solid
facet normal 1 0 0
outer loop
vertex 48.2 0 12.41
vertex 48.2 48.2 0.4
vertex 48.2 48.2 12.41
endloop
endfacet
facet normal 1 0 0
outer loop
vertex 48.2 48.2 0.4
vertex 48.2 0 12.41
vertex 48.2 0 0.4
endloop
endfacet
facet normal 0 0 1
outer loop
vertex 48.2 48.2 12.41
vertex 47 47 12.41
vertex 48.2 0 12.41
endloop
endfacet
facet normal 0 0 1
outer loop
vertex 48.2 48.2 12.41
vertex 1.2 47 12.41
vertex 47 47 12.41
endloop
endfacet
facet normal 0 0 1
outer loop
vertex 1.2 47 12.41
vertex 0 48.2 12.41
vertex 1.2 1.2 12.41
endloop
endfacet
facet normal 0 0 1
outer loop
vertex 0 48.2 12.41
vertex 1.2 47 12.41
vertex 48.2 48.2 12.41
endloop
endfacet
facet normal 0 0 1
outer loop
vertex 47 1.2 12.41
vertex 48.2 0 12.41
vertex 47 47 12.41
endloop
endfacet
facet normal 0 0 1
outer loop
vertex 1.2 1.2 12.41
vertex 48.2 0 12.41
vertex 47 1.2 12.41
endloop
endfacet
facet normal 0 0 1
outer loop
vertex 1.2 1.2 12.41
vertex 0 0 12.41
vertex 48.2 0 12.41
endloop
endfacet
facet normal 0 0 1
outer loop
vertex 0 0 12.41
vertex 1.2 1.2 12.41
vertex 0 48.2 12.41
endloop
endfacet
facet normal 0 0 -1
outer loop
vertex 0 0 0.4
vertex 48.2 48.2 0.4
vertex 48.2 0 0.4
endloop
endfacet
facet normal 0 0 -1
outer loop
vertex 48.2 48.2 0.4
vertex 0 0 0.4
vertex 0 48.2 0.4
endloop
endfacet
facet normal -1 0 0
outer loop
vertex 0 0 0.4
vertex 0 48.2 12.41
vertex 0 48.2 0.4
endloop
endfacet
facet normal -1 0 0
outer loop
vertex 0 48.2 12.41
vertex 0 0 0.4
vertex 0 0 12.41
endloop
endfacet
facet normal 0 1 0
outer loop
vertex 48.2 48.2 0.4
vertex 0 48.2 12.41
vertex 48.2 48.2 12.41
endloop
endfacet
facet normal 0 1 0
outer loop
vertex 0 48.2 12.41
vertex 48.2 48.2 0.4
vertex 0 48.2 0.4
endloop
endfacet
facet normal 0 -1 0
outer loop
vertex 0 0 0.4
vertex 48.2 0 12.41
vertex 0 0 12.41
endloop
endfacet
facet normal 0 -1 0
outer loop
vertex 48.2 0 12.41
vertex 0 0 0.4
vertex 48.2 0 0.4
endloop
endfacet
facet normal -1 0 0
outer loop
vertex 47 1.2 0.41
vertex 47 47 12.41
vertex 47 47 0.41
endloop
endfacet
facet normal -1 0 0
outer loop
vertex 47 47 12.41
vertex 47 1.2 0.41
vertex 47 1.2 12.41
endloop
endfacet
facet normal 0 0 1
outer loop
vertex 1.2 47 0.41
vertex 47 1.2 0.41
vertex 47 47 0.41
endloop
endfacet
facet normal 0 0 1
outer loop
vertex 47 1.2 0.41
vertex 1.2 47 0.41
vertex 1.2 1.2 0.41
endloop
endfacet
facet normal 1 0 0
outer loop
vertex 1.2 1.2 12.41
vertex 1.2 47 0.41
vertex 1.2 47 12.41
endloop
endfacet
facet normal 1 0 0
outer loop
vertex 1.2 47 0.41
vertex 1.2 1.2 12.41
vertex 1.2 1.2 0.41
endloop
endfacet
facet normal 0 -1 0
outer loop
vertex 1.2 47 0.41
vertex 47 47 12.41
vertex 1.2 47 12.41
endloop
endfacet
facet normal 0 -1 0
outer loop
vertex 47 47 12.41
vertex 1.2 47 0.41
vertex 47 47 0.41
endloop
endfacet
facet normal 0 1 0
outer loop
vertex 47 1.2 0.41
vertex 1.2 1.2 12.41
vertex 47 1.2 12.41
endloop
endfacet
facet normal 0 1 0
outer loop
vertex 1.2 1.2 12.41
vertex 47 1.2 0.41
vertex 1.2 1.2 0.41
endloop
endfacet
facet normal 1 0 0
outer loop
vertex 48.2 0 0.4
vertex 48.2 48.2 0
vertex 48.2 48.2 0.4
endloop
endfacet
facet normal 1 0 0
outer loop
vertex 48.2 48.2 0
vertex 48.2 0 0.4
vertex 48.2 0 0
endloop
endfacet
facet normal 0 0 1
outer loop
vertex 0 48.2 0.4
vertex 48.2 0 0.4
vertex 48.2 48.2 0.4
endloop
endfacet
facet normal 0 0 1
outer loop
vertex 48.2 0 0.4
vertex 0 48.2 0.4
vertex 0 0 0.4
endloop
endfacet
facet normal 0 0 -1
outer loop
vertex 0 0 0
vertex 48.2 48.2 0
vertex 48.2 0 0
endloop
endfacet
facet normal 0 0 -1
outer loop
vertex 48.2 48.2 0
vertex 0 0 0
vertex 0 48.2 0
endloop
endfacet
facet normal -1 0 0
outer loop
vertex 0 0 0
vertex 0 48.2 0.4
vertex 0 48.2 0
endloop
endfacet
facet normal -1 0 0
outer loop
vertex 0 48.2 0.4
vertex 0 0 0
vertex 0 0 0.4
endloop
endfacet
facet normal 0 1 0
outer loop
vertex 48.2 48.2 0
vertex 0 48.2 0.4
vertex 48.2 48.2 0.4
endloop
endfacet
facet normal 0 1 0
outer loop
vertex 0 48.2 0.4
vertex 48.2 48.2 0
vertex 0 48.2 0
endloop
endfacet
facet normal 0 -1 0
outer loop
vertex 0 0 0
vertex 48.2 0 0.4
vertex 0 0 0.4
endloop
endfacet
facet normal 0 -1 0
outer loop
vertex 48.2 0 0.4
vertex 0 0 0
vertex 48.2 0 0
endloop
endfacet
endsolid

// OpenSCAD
// file: ../../Base/Rotation.scad
// Fischertechnik Box Foundation
// Geometry Helpers Rotation

include <PlacementOptions.scad>

// getRotatedSpace(space, rotation=NoRotation)
// Rotates the space dependent on the specified rotation

function getRotatedSpace(space, rotation=NoRotation) = [
    (rotation == Rotate90 || rotation == Rotate270) ? space.y : space.x,
    (rotation == Rotate90 || rotation == Rotate270) ? space.x : space.y
];

// Rotates the given space around the fixed left lower corner
// space = the space the children needs as width/depth list [width,depth]
// rotation = 0 Rotate0 degrees, 1 Rotate90 degrees, 2 Rotate180 degrees, 3 Rotate270 degrees (equivalent to -90)

module RotateFix(space, rotation=NoRotation) {
    dy = (rotation == Rotate0 || rotation == Rotate270) ? 0 :
        (rotation == Rotate90) ? space.x :
        space.y;
    dx = (rotation < Rotate180) ? 0 :
        (rotation == Rotate180) ? space.x :
        space.y;
    
    translate([dx, dy, 0])
        rotate([0, 0, rotations[rotation]])
            children();
}
// file: ../../Base/Alignment.scad
// Fischertechnik Box Foundation
// Geometry Helpers Alignment

include <PlacementOptions.scad>

// getAlignedX(elementWidth, spaceWidth, align=AlignRight, offset=0)
// Gets the aligned X offset of an element with the given
// width in the given space.
// elementWidth = The width of the element to positon
// spaceWidth = The space where the element should be aligned
// align = 0 AlignLeft, 1 AlignCenter, 2 AlignRight
// offset = an optional offset from the aligned position. When
// aligned left or centered, then positive values are in X direction.
// When aligned right then positive values are in negative X direction.

function getAlignedX(elementWidth, spaceWidth, align=AlignRight, offset=0) =
    (align == AlignLeft) ?
        offset :
        ((align == AlignCenter) ?
        (spaceWidth - elementWidth)/2 + offset :
        spaceWidth - offset - elementWidth);

// getAlignedY(elementDepth, spaceDepth, align=AlignTop, offset=0)
// Gets the aligned Y offset of an element with the given
// depth in the given space.
// elementDepth = The depth of the element to positon
// spaceDepth = The space where the element should be aligned
// align = 0 AlignBottom, 1 AlignCenter, 2 AlignTop
// offset = an optional offset from the aligned position. When
// aligned bottom or centered, then positive values are in Y direction.
// When aligned top then positive values are in negative Y direction.

function getAlignedY(elementDepth, spaceDepth, align=AlignTop, offset=0) =
    (align == AlignBottom) ?
        offset :
        ((align == AlignCenter) ?
        (spaceDepth - elementDepth)/2 + offset :
        spaceDepth - offset - elementDepth);
// file: ../../Base/PlacementOptions.scad
// Fischertechnik Box Foundation
// Placement Options

// Alignment
NoAlign = 0;
AlignLeft = 1;
AlignBottom = 2;
AlignCenter = 3;
AlignRight = 4;
AlignTop = 5;

// Element rotation degree steps
rotations = [0, -90, -180, -270];

// Rotation
NoRotation = 0;
Rotate0 = 0;
Rotate90 = 1;
Rotate180 = 2;
Rotate270 = 3;

// Docking (seen from above)
NoDock = -1;
DockLeft = 0;
DockTop = 1;
DockRight = 2;
DockCorner = 2;
DockBottom = 3;

// Web corners
LowerLeft = 0;
UpperLeft = 1;
UpperRight = 2;
LowerRight = 3;

// Web position relative to corner
LeftOfCorner = 0;
RightOfCorner = 1;
// file: ../../Base/Boxes.scad
// Fischertechnik Box Foundation
// Pre-designed Boxes

use <Constants.scad>

include <PlacementOptions.scad>

box190Width = 190;
box190Depth = 130;
box130Width = 130;
box130Depth = 95;

// Values are from an original ec3 box
topBottomDifference = 1.5;
outerHeight = 40;
innerHeight = 38.2;
baseThickness = outerHeight - innerHeight;
stackExcess = 5.7;
radius = 3.5;
wallThickness = 1.5;
tolerance = 0.2;
stackOffset = innerHeight - stackExcess;

boxUsageHeight = stackOffset;
boxWallThickness = wallThickness;
boxBaseThickness = baseThickness;
boxWebWidth = 3.0;

// getBoxWallThickness()
// Gets the wall thickness of a Fischertechnik Box
function getBoxWallThickness() = boxWallThickness;

// getBoxUsageHeight()
// Gets the usable height of a Fischertechnik box
function getBoxUsageHeight() = boxUsageHeight;

// getBoxInnerHeight()
// Gets the inner height of a Fischertechnik box, including the stack excess
function getBoxInnerHeight() = innerHeight;

// getBoxBaseThickness()
// Gets the thickness of the Fischertechnik box base.
function getBoxBaseThickness() = boxBaseThickness;

// getBoxWebWidth()
// Gets the width of a box web
function getBoxWebWidth() = boxWebWidth;

// getBox190Space()
// Gets the usable inner space of a Box 190 as an x/y-list
function getBox190Space() = [
    box190Width - 2*getBoxWallThickness() - topBottomDifference, 
    box190Depth - 2*getBoxWallThickness() - topBottomDifference ];

// BoxBase(width, depth)
// Creates an empty stackable Fischertechnik compatible box
// width = Outer width of the box (190, 130, ...)
// depth = Outer depth of the box (130, 95, ...)

module BoxBase(width, depth, height=outerHeight) {    
    thinPlate = 0.01;

    innerHeight = height - baseThickness;    
    
    module BodyPlate(width, depth) {
        translate([radius, radius])
        hull() {
            w = width-2*radius;
            d = depth-2*radius;
            cube([w, d, thinPlate]);
            cylinder(thinPlate, r=radius, $fn=getFragments());
            translate([w, 0])
                cylinder(thinPlate, r=radius, $fn=getFragments());
            translate([w, d])
                cylinder(thinPlate, r=radius, $fn=getFragments());
            translate([0, d])
                cylinder(thinPlate, r=radius, $fn=getFragments());
        }
    }
    
    module Body(tolerance=tolerance) {
        hull() {
            // Bottom with tolerance to fit into the original boxes when stacked
            translate([-wallThickness+tolerance, -wallThickness+tolerance, -baseThickness])
                BodyPlate(width-topBottomDifference-2*tolerance, depth-topBottomDifference-2*tolerance);
            
            // Top
            translate([-wallThickness-topBottomDifference/2, -wallThickness-topBottomDifference/2, innerHeight-thinPlate])
                BodyPlate(width, depth);
         }
    }

    module Cutoff() {
        hull() {
            coWidth = width - 2*wallThickness;
            coDepth = depth - 2*wallThickness;
            
            // Bottom
            BodyPlate(coWidth-topBottomDifference, coDepth-topBottomDifference);

            // Top
            translate([-topBottomDifference/2, -topBottomDifference/2, innerHeight+thinPlate]) 
                BodyPlate(coWidth, coDepth);
        }
    }
    
    difference() {        
        Body();
        Cutoff();
        stackOffset = innerHeight - stackExcess;
        translate([0, 0, stackOffset + baseThickness])
            Body(tolerance=0);
    }
}

// Creates the Fischertechnik empty box 130x190 mm and places it at position 0,0
// 190x130 are the outer sizes, the inner space is slightly smaller. Use getBox190Space() to get the inner sizes.
// The box is positioned that the usable inner space is at the 0,0,0 position. The

module Box190() {
    BoxBase(box190Width, box190Depth);
}

// Gets the usable inner space of a Box 130 as an x/y-list
function getBox130Space() = [
    box130Width - 2*getBoxWallThickness() - topBottomDifference, 
    box130Depth - 2*getBoxWallThickness() - topBottomDifference ];

// Creates the Fischertechnik empty box 95x130 mm and places it at position 0,0
// 190x130 are the outer sizes, the inner space is slightly smaller. Use getBox190Space() to get the inner sizes.
// The box is positioned that the usable inner space is at the 0,0,0 position. The

module Box130() {
    BoxBase(box130Width, box130Depth);
}

// Creates a web at the specified box walls
// corner 0 = LowerLeft, 1 = UpperLeft, 2 = UpperRight, 3 = LowerRight
// side 0 = LeftOfCorner, 1 = RightOfCorner
// distance = Distance in mm from the corner
// boxSpace = inner width and depth of the box (default: Box 190)
// webWidth = length of the web (default is 3 mms)
// webThickness = thickness of the web (default is 1 mm)

module BoxWeb(corner, side, distance, boxSpace=getBox190Space(), webWidth=getBoxWebWidth(), webThickness=1.0) {
    sink = getBoxWallThickness()/2;

    width = (corner % 2 == 0) ? 
            (side == LeftOfCorner ? webWidth : webThickness) :
            (side == LeftOfCorner ? webThickness : webWidth);

    depth = (corner % 2 == 0) ? 
            (side == RightOfCorner ? webWidth : webThickness) :
            (side == RightOfCorner ? webThickness : webWidth);
    
    xDiff = corner == LowerLeft ? 
                (side == LeftOfCorner ? -sink : distance) :
            (corner == UpperLeft ?                
                (side == LeftOfCorner ? distance : -sink) :
            (corner == UpperRight ?
                (side == LeftOfCorner ? boxSpace.x-webWidth+sink : boxSpace.x-distance-webThickness) :
                (side == LeftOfCorner ? boxSpace.x-distance-webThickness: boxSpace.x-webWidth+sink)));

    yDiff = corner == LowerLeft ? 
                (side == RightOfCorner ? -sink : distance) :
            (corner == UpperLeft ?
                (side == RightOfCorner ? boxSpace.y-distance : boxSpace.y-webWidth+sink) :
            (corner == UpperRight ?
                (side == RightOfCorner ? boxSpace.y-webWidth+sink : boxSpace.y-distance) :
                (side == RightOfCorner ? distance : -sink)));
    
    translate([xDiff, yDiff, -getExcess()])
        cube([width, depth, boxUsageHeight + 2*getExcess()]);
}
// file: ../../Base/Placement.scad
// Fischertechnik Box Foundation
// Geometry Helpers Placement

use <Constants.scad>
use <Alignment.scad>
use <Rotation.scad>
use <Boxes.scad>

include <PlacementOptions.scad>

// Place(x=0, y=0, elementSpace=[0,0], alignX=AlignLeft, alignY=AlignBottom, rotation=Rotate0, boxSpace=getBox190Space())
// Places the child at the specified position
// y = Y-Position. This is a relative position when an X aligment is specified.
// x = X-Position. This is a relative position when an Y aligment is specified.
// elementSpace = space of the element to be placed [x,y]
// alignX = -1=NoAlign, 0 AlignLeft, 1 AlignCenter, 3 AlignRight (elementSpace and boxSpace required!)
// alignY = -1=NoAlign, 2 AlignBottom, 1 AlignCenter, 4 AlignTop (elementSpace and boxSpace required!)
// rotation = 0 Rotate0 0 degrees, 1 Rotate90 90 degrees, 
// 2 Rotate180 180 degrees, 3 Rotate270 270 degrees (equivalent to -90)
// boxSpace = Inner space of the box where the placement occurs [x,y] - default is Box 190x130 inner space

module Place(x=0, y=0, elementSpace=[0,0], 
  alignX=AlignLeft, alignY=AlignBottom, 
  rotation=NoRotation, boxSpace=getBox190Space()) {

    module Position(x, y, space, rotation=Rotate0) {
        translate([x, y, 0])
            RotateFix(space, rotation)
                children();
    }

    space = getRotatedSpace(elementSpace, rotation);
    alignedX = getAlignedX(space.x, boxSpace.x, alignX, x);
    alignedY = getAlignedY(space.y, boxSpace.y, alignY, y);
    Position(alignedX, alignedY, elementSpace, rotation)
        children();
}

// Center(space=getBox130Space(), elementSpace=[0,0])
// space = Space where the children is centered. For cylinder use centered=true and no elementSpace.
// elementSpace = space of the element to be centered [x,y]

module Center(space=getBox190Space(), elementSpace=[0,0]) {
    Place(elementSpace=elementSpace, boxSpace=space, alignX=AlignCenter, alignY=AlignCenter)
        children();
}

// CenterHorizontal(width=0, y=0, offset=0, space=getBox130Space())
// width = Width of the element to be placed.
// y = Y position of the element
// offset = Offset from the center position (negative will be left of the center)
// space = Space where the element is placed

module CenterHorizontal(width=0, y=0, offset=0, space=getBox190Space()) {
    Place(x=offset, y=y, elementSpace=[width, 0], boxSpace=space, alignX=AlignCenter)
        children(0);
}

// CenterVertical(depth=0, x=0, offset=0, space=getBox130Space())
// depth = Depth of the element to be placed.
// x = X position of the element
// offset = Offset from the center position (negative will be down of the center)
// space = Space where the element is placed

module CenterVertical(depth=0, x=0, offset=0, space=getBox190Space()) {
    Place(x=x, y=offset, elementSpace=[0, depth], boxSpace=space, alignY=AlignCenter)
        children(0);
}

// getIsVertical(align)
// True if the specified alignment needs a vertical orientation for a divider (AlignRight, AlignLeft)

function getIsVertical(align) = (align == AlignRight || align == AlignLeft);

// getIsHorizontal(align)
// True if the specified alignment needs a horizontal orientation for a divider (AlignTop, AlignBottom)

function getIsHorizontal(align) = (align == AlignTop || align == AlignBottom);
// file: ../../Elements/AxisClip10.scad
// Fischertechnik Box Library
// Axis for clip 10
// 31023

use <../ModelBase/Simple.scad>
use <../Base/Constants.scad>

width = 12;
depth = 12;
height = 23;
upperDiameter = 3.6;
clipHeight = 10;

// getAxisClip10Space()
// Gets the space of a frame for a clip 10 with spring ring (mot2)

function getAxisClip10Space() = [width, depth, height];

// AxisClip10(height, clipHeight)
// Axis for clip 10 with spring ring (mot2)
// height = Height of the complete axis
// clipHeight = Height of the rt for the clip (standard is 10, in mot3 its only 7)

module AxisClip10(height=height, clipHeight=clipHeight) {
    LeveledAxisWithSpace(height, height-clipHeight, getAxisClip10Space(), diameter=upperDiameter);
}

// Tests
color("lightgray")
AxisClip10();
// file: ../../Base/Constants.scad
// Fischertechnik Box Foundation
// Constants

// Constant values necessary for multiple elements

// Base constants
dividerThickness = 1.2;
excess = 0.01;
fragments = 90;
tolerance = 0.8;

// Gets the thickness of a divider 
function getDividerThickness() = dividerThickness;

// Gets the excess that is used to merge walls into each other
function getExcess() = excess;

// Gets amount of fragments of a cylinder
function getFragments() = fragments;

// Gets the inner tolerance of a frame to each side
function getTolerance() = tolerance;


// Fischertechnik specific constants
axisDiameter = 4;
axisBottomDiameter = axisDiameter + 1;
standardEdgeDistance = 2.5;
standardWebDistance = 11.5;
standardCornerLength = 15;
tubeWallFactor = 0.8;
smallPartsFrameHeight = 20;

// Gets axis diameter
function getAxisDiameter() = axisDiameter;

// Gets axis bottom diameter for thicker part at the bottom
function getAxisBottomDiameter() = axisBottomDiameter;

// gets the standard distance to the wall of the box for dockable frames with webs
function getStandardEdgeDistance() = standardEdgeDistance;

// gets the standard distance of each web to the corner of the dockable frame
function getStandardWebDistance() = standardWebDistance;

// gets the standard length of the corner walls of a dockable frame
function getStandardCornerLength() = standardCornerLength;

// gets the wall thickness of a tube.
function getTubeWallThickness() = tubeWallFactor * getDividerThickness();

// gets the frame height for docked small parts boxes.
function getSmallPartsFrameHeight() = smallPartsFrameHeight;
// file: ../../Elements/FrameGearBox.scad
// Fischertechnik Box Library
// Frame for gear box
// 31048

use <../ModelBase/Simple.scad>

width = 45;
depth = 45;
height = 12;

// getFrameGearBoxSpace()
// Gets the space of a frame for a gearbox (mot2)

function getFrameGearBoxSpace() = getFrameOuterVolume([width, depth, height]);

// FrameGearBox()
// frame for a gearbox (mot2)

module FrameGearBox() {
    Frame([width, depth, height]);
}

// Tests
color("lightgray")
FrameGearBox();
// file: ../TestPrint.scad
// 3D Print Test Base

use <../Base/Constants.scad>

use <../Elements/AxisClip10.scad>

module TestPrint(elementSpace) {
    cube([elementSpace.x, elementSpace.y, 0.4]);
    translate([0,0,0.4+getExcess()]) {
        children();
    }
}

TestPrint(getAxisClip10Space())
    AxisClip10();
// main file
// 3D Print Test
// FrameGearBox

use <../TestPrint.scad>
use <../../Elements/FrameGearBox.scad>

TestPrint(getFrameGearBoxSpace())
    FrameGearBox();
